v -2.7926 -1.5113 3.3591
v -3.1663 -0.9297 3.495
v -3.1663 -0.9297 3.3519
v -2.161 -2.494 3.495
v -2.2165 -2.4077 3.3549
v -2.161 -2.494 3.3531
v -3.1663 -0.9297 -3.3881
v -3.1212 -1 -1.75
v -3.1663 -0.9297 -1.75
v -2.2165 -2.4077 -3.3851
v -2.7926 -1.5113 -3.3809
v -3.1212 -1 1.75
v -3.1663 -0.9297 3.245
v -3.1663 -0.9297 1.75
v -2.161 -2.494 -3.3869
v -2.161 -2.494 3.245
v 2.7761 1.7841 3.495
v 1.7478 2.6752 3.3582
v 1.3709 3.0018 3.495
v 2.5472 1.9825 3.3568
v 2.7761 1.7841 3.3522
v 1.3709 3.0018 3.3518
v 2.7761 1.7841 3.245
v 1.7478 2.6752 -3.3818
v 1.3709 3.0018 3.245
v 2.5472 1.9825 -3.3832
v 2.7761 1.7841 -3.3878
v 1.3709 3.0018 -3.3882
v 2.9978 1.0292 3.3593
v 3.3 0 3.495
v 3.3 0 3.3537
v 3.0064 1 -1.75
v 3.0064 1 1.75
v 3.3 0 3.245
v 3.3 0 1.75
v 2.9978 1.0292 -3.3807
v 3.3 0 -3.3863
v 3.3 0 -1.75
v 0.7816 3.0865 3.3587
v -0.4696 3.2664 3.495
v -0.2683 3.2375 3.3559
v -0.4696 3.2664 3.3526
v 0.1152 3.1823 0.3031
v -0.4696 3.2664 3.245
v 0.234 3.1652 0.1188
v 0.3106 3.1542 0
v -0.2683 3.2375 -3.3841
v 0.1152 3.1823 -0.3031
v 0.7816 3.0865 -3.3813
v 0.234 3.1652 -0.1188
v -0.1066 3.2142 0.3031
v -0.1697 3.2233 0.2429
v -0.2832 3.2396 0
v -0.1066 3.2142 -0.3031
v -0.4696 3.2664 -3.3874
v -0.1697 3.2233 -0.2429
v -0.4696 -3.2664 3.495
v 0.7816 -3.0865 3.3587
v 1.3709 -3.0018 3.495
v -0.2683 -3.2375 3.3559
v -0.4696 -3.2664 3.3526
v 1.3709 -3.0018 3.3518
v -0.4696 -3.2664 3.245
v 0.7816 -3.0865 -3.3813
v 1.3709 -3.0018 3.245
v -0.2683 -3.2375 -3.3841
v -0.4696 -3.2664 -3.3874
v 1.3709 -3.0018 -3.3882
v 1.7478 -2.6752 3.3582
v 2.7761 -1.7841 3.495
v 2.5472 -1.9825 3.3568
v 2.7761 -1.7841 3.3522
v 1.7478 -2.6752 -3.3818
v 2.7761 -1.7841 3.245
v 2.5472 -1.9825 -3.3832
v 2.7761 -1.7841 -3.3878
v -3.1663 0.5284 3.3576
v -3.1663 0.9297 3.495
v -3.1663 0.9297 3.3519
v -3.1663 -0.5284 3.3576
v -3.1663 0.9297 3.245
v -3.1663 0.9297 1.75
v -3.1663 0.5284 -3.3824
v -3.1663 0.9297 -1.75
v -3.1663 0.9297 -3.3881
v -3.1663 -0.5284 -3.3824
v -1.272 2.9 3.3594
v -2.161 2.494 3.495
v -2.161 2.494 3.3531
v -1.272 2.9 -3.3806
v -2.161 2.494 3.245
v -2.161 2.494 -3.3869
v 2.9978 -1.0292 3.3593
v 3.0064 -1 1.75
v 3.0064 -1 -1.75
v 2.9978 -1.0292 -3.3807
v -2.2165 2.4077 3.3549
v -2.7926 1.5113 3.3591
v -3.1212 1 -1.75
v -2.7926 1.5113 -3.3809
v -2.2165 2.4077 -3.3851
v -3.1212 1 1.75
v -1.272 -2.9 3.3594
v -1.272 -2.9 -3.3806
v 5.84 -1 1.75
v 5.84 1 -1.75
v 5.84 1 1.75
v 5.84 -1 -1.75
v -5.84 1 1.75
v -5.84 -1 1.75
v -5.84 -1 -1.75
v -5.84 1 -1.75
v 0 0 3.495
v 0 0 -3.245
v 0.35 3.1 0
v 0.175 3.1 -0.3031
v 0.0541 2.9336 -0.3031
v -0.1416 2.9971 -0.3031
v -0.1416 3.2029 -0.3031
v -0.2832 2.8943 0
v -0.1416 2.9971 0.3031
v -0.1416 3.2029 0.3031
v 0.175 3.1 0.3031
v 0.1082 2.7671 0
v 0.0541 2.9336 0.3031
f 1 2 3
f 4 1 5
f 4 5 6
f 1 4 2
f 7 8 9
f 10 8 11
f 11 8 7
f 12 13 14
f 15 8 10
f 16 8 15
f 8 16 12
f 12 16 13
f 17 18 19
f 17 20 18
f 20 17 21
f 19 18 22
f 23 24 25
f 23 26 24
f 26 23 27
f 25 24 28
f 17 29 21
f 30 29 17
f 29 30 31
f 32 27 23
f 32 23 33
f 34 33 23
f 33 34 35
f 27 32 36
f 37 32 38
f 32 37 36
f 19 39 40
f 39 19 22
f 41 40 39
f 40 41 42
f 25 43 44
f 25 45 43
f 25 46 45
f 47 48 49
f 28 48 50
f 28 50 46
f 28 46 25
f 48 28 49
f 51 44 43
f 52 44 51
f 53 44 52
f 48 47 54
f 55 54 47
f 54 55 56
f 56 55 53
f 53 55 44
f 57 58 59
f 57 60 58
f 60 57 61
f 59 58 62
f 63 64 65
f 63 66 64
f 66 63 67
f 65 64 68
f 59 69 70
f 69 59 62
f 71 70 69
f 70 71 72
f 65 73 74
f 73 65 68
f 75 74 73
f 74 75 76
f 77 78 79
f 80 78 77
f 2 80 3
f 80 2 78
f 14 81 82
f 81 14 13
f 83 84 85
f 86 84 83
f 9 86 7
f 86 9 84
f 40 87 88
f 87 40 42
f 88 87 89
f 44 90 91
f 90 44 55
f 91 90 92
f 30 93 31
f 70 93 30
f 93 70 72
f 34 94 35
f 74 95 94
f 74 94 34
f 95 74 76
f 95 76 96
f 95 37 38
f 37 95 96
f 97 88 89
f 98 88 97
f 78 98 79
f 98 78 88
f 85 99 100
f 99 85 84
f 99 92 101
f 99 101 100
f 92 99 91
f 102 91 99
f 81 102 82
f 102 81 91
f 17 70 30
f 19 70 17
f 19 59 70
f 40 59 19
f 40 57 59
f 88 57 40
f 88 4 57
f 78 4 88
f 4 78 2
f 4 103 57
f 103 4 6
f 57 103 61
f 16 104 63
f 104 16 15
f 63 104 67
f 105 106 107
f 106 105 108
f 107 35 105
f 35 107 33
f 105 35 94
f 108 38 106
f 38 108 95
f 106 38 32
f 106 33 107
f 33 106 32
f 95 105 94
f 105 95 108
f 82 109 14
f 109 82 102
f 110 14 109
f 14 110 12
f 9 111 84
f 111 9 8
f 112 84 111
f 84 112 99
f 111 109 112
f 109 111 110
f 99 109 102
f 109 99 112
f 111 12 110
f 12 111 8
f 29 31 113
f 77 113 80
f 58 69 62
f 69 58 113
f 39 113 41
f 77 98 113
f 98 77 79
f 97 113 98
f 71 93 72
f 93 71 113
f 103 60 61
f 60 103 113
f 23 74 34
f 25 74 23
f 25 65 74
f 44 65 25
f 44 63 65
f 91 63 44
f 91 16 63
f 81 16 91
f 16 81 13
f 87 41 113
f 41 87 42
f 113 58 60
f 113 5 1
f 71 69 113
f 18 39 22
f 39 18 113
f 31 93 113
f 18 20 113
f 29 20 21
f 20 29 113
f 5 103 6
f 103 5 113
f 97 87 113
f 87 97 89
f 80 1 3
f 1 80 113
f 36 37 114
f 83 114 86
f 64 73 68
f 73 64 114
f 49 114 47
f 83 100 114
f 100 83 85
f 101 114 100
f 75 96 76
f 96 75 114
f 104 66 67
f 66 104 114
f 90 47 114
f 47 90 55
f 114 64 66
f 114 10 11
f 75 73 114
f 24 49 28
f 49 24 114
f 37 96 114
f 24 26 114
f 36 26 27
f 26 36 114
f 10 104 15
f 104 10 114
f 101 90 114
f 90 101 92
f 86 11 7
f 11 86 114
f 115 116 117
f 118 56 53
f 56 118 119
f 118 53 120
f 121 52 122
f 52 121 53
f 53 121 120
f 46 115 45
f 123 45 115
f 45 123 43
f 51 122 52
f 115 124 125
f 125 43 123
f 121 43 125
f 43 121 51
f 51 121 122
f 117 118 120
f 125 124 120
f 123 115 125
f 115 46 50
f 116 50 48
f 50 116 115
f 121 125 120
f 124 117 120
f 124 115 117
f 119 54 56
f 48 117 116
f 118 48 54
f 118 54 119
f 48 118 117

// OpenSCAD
// Parameters
bbox_X = 11.68; //[5.84:23.36:0.01]
bbox_Y = 6.6; //[3.3:13.2:0.01]
bbox_Z = 6.99; //[3.495:13.98:0.01]
cyl_D = 6.6; //[3.3:13.2:0.01]
cyl_H = 6.99; //[3.495:13.98:0.01]
lug_total_span_X = 11.68; //[5.84:23.36:0.01]
lug_radial_len = 2.54; //[1.27:5.08:0.01]
lug_thk_Y = 2.0; //[1.0:4.0:0.01]
lug_H = 3.5; //[1.75:7.0:0.01]
lug_z_center = 0.0; //[-3.495:3.495:0.01]
lug_y_center = 0.0; //[-1.0:1.0:0.01]
fillet_r = 0.3; //[0.15:0.6:0.01]
overlap = 0.8; //[0.2:2.0:0.01]
chamfer_depth = 0.25; //[0.1:0.6:0.01]
mark_r = 0.35; //[0.15:0.8:0.01]
mark_depth = 0.2; //[0.05:0.5:0.01]

// Base Shapes
module cyl_body() {
  translate([0, 0, 0])
    cylinder(h=cyl_H, r=cyl_D/2, center=true);
}

module lug_pos() {
  translate([cyl_D/2 + (lug_radial_len + overlap)/2 - overlap, lug_y_center, lug_z_center])
    cube([lug_radial_len + overlap, lug_thk_Y, lug_H], center=true);
}

module lug_neg() {
  translate([-(cyl_D/2 + (lug_radial_len + overlap)/2 - overlap), lug_y_center, lug_z_center])
    cube([lug_radial_len + overlap, lug_thk_Y, lug_H], center=true);
}

module lug_fillet_sphere_pos_in() {
  translate([cyl_D/2 - overlap, lug_y_center + lug_thk_Y/2 - fillet_r, lug_z_center + lug_H/2 - fillet_r])
    sphere(r=fillet_r);
}

module lug_fillet_sphere_pos_out() {
  translate([cyl_D/2 + lug_radial_len - overlap, lug_y_center + lug_thk_Y/2 - fillet_r, lug_z_center + lug_H/2 - fillet_r])
    sphere(r=fillet_r);
}

module lug_fillet_sphere_pos_in2() {
  translate([cyl_D/2 - overlap, lug_y_center - lug_thk_Y/2 + fillet_r, lug_z_center + lug_H/2 - fillet_r])
    sphere(r=fillet_r);
}

module lug_fillet_sphere_pos_out2() {
  translate([cyl_D/2 + lug_radial_len - overlap, lug_y_center - lug_thk_Y/2 + fillet_r, lug_z_center + lug_H/2 - fillet_r])
    sphere(r=fillet_r);
}

module lug_fillet_sphere_pos_in3() {
  translate([cyl_D/2 - overlap, lug_y_center + lug_thk_Y/2 - fillet_r, lug_z_center - lug_H/2 + fillet_r])
    sphere(r=fillet_r);
}

module lug_fillet_sphere_pos_out3() {
  translate([cyl_D/2 + lug_radial_len - overlap, lug_y_center + lug_thk_Y/2 - fillet_r, lug_z_center - lug_H/2 + fillet_r])
    sphere(r=fillet_r);
}

module lug_fillet_sphere_pos_in4() {
  translate([cyl_D/2 - overlap, lug_y_center - lug_thk_Y/2 + fillet_r, lug_z_center - lug_H/2 + fillet_r])
    sphere(r=fillet_r);
}

module lug_fillet_sphere_pos_out4() {
  translate([cyl_D/2 + lug_radial_len - overlap, lug_y_center - lug_thk_Y/2 + fillet_r, lug_z_center - lug_H/2 + fillet_r])
    sphere(r=fillet_r);
}

module lug_fillet_sphere_neg_in() {
  translate([-(cyl_D/2 - overlap), lug_y_center + lug_thk_Y/2 - fillet_r, lug_z_center + lug_H/2 - fillet_r])
    sphere(r=fillet_r);
}

module lug_fillet_sphere_neg_out() {
  translate([-(cyl_D/2 + lug_radial_len - overlap), lug_y_center + lug_thk_Y/2 - fillet_r, lug_z_center + lug_H/2 - fillet_r])
    sphere(r=fillet_r);
}

module lug_fillet_sphere_neg_in2() {
  translate([-(cyl_D/2 - overlap), lug_y_center - lug_thk_Y/2 + fillet_r, lug_z_center + lug_H/2 - fillet_r])
    sphere(r=fillet_r);
}

module lug_fillet_sphere_neg_out2() {
  translate([-(cyl_D/2 + lug_radial_len - overlap), lug_y_center - lug_thk_Y/2 + fillet_r, lug_z_center + lug_H/2 - fillet_r])
    sphere(r=fillet_r);
}

module lug_fillet_sphere_neg_in3() {
  translate([-(cyl_D/2 - overlap), lug_y_center + lug_thk_Y/2 - fillet_r, lug_z_center - lug_H/2 + fillet_r])
    sphere(r=fillet_r);
}

module lug_fillet_sphere_neg_out3() {
  translate([-(cyl_D/2 + lug_radial_len - overlap), lug_y_center + lug_thk_Y/2 - fillet_r, lug_z_center - lug_H/2 + fillet_r])
    sphere(r=fillet_r);
}

module lug_fillet_sphere_neg_in4() {
  translate([-(cyl_D/2 - overlap), lug_y_center - lug_thk_Y/2 + fillet_r, lug_z_center - lug_H/2 + fillet_r])
    sphere(r=fillet_r);
}

module lug_fillet_sphere_neg_out4() {
  translate([-(cyl_D/2 + lug_radial_len - overlap), lug_y_center - lug_thk_Y/2 + fillet_r, lug_z_center - lug_H/2 + fillet_r])
    sphere(r=fillet_r);
}

module chamfer_top_cone() {
  translate([0, 0, cyl_H/2 - chamfer_depth/2])
    cylinder(h=chamfer_depth, r1=cyl_D/2 + lug_radial_len, r2=0, center=true);
}

module chamfer_bot_cone() {
  translate([0, 0, -(cyl_H/2 - chamfer_depth/2)])
    cylinder(h=chamfer_depth, r1=cyl_D/2 + lug_radial_len, r2=0, center=true);
}

module marking_dimple() {
  translate([0, cyl_D/2 - mark_depth, 0])
    sphere(r=mark_r);
}

// Operations
module lug_blend_fillets_pos() {
  hull() {
    lug_fillet_sphere_pos_in();
    lug_fillet_sphere_pos_out();
    lug_fillet_sphere_pos_in2();
    lug_fillet_sphere_pos_out2();
    lug_fillet_sphere_pos_in3();
    lug_fillet_sphere_pos_out3();
    lug_fillet_sphere_pos_in4();
    lug_fillet_sphere_pos_out4();
  }
}

module lug_blend_fillets_neg() {
  hull() {
    lug_fillet_sphere_neg_in();
    lug_fillet_sphere_neg_out();
    lug_fillet_sphere_neg_in2();
    lug_fillet_sphere_neg_out2();
    lug_fillet_sphere_neg_in3();
    lug_fillet_sphere_neg_out3();
    lug_fillet_sphere_neg_in4();
    lug_fillet_sphere_neg_out4();
  }
}

module lug_blend_fillets() {
  union() {
    lug_blend_fillets_pos();
    lug_blend_fillets_neg();
  }
}

module main_union_pre() {
  union() {
    cyl_body();
    lug_pos();
    lug_neg();
    lug_blend_fillets();
  }
}

module edge_chamfers() {
  difference() {
    main_union_pre();
    chamfer_top_cone();
    chamfer_bot_cone();
  }
}

module surface_markings() {
  difference() {
    edge_chamfers();
    marking_dimple();
  }
}

// Final Output
surface_markings();
